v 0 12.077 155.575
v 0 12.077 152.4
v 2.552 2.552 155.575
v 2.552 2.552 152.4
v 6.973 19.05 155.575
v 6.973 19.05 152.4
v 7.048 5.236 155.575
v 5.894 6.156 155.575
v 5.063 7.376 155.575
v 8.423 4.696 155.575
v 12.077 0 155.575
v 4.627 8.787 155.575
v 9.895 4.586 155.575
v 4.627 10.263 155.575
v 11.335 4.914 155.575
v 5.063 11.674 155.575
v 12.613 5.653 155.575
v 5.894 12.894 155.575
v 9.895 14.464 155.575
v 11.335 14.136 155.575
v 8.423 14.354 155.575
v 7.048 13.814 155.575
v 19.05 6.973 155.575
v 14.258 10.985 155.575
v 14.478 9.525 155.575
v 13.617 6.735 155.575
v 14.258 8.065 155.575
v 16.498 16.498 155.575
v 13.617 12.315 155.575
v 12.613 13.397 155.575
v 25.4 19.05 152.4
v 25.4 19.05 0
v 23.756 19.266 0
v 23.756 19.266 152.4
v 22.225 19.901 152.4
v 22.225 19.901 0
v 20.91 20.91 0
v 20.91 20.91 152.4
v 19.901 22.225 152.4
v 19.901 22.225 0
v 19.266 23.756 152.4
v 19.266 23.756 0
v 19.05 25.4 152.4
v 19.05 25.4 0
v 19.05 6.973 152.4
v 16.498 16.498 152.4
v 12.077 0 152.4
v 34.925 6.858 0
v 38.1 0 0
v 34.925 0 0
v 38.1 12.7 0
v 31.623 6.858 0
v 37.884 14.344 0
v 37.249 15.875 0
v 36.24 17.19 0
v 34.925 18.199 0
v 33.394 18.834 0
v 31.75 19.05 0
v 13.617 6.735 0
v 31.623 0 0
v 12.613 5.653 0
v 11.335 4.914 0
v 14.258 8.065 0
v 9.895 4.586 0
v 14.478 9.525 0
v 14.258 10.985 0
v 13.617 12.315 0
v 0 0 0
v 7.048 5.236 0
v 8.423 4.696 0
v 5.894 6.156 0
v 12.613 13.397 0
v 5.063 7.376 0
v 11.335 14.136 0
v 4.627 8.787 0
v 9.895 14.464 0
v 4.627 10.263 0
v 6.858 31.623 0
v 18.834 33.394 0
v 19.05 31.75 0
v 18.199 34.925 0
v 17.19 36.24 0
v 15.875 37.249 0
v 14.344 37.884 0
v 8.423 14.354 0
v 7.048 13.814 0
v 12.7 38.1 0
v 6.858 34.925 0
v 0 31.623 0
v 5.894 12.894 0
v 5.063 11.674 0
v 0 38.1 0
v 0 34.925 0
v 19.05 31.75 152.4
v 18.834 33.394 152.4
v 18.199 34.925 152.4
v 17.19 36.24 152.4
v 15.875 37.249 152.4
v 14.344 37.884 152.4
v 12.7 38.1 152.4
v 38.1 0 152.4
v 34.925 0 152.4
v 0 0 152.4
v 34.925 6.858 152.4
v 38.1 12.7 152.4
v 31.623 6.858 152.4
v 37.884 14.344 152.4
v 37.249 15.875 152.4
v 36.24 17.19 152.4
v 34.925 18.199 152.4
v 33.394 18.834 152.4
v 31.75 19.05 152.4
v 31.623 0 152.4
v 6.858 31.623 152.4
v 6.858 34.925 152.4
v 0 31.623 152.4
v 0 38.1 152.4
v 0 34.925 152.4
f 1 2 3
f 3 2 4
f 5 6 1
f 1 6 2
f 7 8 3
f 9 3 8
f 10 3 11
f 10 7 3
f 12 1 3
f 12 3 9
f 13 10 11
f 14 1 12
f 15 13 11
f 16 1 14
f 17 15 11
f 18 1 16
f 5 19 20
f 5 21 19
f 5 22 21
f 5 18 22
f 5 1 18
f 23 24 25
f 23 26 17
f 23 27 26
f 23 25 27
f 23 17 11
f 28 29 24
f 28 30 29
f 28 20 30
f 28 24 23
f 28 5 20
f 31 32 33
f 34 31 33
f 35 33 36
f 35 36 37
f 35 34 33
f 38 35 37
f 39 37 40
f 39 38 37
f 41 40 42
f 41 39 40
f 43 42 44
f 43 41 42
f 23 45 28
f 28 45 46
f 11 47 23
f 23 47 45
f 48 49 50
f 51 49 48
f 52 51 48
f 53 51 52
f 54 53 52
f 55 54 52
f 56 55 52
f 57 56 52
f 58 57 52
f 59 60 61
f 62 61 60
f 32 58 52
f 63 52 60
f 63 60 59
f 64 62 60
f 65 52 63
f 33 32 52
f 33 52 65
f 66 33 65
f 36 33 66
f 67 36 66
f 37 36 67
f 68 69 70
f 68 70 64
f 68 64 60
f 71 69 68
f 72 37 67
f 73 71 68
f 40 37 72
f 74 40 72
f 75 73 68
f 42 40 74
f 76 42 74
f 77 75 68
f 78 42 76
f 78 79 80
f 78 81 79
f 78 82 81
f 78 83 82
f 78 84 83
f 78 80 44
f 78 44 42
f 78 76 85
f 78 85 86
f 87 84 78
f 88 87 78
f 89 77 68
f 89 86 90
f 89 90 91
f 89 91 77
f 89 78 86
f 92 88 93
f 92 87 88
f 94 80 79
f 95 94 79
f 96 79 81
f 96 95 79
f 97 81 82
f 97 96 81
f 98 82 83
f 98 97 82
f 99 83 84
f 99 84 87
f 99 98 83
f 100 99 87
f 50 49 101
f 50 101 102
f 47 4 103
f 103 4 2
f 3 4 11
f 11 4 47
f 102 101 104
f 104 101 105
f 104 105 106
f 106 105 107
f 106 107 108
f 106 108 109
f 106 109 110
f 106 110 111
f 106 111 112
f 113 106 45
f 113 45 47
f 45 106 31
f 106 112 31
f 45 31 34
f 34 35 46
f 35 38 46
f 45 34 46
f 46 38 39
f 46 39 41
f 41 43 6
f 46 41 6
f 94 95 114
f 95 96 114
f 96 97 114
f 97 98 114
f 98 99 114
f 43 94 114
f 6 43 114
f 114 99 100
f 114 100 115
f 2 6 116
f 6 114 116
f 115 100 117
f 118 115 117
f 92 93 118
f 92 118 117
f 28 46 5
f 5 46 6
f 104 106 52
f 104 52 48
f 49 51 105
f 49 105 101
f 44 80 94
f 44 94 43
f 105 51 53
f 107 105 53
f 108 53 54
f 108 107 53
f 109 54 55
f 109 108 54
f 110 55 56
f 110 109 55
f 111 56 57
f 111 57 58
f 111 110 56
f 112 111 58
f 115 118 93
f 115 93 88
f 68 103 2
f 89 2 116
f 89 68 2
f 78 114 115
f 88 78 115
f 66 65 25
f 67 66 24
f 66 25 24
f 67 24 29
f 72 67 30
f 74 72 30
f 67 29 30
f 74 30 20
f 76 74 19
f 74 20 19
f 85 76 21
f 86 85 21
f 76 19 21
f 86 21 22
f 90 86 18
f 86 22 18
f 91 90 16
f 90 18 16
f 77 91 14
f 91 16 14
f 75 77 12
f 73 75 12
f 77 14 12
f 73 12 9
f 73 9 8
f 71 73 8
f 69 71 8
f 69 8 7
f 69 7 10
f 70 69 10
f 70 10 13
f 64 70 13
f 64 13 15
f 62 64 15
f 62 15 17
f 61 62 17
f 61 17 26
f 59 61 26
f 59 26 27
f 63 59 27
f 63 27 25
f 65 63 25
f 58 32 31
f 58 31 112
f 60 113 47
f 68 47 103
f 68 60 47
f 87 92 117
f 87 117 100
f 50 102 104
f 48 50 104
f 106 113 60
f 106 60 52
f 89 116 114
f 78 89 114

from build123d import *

# Parameters (mm, degrees)
BOSS_EXTRUDE1_DEPTH = 152.4
SKETCH2_W           = 6.858
SKETCH2_H           = 3.302
SKETCH2_W_2         = 3.302
SKETCH2_H_2         = 6.858
CUT_EXTRUDE1_DEPTH  = 153.4
BOSS_EXTRUDE2_DEPTH = 3.175
FILLET1_R           = 6.35
SKETCH4_R           = 4.953
CUT_EXTRUDE2_DEPTH  = 156.575


with BuildPart() as part:
    # Sketch1 → Boss-Extrude1 (new body)
    with BuildSketch(Plane.XY):
        Polygon((0, 0), (0, 38.1), (19.05, 38.1), (19.05, 19.05), (38.1, 19.05), (38.1, 0), align=None)
    extrude(amount=BOSS_EXTRUDE1_DEPTH)

    # Sketch2 → Cut-Extrude1 (cut, through all)
    with BuildSketch(Plane.XY.offset(152.4)):
        with Locations((3.429, 33.274)):
            Rectangle(SKETCH2_W, SKETCH2_H)
        with Locations((33.274, 3.429)):
            Rectangle(SKETCH2_W_2, SKETCH2_H_2)
    extrude(amount=-CUT_EXTRUDE1_DEPTH, mode=Mode.SUBTRACT)

    # Sketch3 → Boss-Extrude2 (add)
    with BuildSketch(Plane.XY.offset(152.4)):
        Polygon((16.497783942, 16.497783942), (6.972783942, 19.05), (0, 12.077216058), (2.552216058, 2.552216058), (12.077216058, 0), (19.05, 6.972783942), align=None)
    extrude(amount=BOSS_EXTRUDE2_DEPTH)

    # Fillet1
    fillet1_edges = [part.edges().sort_by_distance(p)[0] for p in [
        (19.05, 38.1, 76.2),
        (19.05, 19.05, 76.2),
        (38.1, 19.05, 76.2),
    ]]
    fillet(fillet1_edges, radius=FILLET1_R)

    # Sketch4 → Cut-Extrude2 (cut, through all)
    with BuildSketch(Plane.XY.offset(155.575)):
        with Locations((9.525, 9.525)):
            Circle(SKETCH4_R)
    extrude(amount=-CUT_EXTRUDE2_DEPTH, mode=Mode.SUBTRACT)


solid = part.part
